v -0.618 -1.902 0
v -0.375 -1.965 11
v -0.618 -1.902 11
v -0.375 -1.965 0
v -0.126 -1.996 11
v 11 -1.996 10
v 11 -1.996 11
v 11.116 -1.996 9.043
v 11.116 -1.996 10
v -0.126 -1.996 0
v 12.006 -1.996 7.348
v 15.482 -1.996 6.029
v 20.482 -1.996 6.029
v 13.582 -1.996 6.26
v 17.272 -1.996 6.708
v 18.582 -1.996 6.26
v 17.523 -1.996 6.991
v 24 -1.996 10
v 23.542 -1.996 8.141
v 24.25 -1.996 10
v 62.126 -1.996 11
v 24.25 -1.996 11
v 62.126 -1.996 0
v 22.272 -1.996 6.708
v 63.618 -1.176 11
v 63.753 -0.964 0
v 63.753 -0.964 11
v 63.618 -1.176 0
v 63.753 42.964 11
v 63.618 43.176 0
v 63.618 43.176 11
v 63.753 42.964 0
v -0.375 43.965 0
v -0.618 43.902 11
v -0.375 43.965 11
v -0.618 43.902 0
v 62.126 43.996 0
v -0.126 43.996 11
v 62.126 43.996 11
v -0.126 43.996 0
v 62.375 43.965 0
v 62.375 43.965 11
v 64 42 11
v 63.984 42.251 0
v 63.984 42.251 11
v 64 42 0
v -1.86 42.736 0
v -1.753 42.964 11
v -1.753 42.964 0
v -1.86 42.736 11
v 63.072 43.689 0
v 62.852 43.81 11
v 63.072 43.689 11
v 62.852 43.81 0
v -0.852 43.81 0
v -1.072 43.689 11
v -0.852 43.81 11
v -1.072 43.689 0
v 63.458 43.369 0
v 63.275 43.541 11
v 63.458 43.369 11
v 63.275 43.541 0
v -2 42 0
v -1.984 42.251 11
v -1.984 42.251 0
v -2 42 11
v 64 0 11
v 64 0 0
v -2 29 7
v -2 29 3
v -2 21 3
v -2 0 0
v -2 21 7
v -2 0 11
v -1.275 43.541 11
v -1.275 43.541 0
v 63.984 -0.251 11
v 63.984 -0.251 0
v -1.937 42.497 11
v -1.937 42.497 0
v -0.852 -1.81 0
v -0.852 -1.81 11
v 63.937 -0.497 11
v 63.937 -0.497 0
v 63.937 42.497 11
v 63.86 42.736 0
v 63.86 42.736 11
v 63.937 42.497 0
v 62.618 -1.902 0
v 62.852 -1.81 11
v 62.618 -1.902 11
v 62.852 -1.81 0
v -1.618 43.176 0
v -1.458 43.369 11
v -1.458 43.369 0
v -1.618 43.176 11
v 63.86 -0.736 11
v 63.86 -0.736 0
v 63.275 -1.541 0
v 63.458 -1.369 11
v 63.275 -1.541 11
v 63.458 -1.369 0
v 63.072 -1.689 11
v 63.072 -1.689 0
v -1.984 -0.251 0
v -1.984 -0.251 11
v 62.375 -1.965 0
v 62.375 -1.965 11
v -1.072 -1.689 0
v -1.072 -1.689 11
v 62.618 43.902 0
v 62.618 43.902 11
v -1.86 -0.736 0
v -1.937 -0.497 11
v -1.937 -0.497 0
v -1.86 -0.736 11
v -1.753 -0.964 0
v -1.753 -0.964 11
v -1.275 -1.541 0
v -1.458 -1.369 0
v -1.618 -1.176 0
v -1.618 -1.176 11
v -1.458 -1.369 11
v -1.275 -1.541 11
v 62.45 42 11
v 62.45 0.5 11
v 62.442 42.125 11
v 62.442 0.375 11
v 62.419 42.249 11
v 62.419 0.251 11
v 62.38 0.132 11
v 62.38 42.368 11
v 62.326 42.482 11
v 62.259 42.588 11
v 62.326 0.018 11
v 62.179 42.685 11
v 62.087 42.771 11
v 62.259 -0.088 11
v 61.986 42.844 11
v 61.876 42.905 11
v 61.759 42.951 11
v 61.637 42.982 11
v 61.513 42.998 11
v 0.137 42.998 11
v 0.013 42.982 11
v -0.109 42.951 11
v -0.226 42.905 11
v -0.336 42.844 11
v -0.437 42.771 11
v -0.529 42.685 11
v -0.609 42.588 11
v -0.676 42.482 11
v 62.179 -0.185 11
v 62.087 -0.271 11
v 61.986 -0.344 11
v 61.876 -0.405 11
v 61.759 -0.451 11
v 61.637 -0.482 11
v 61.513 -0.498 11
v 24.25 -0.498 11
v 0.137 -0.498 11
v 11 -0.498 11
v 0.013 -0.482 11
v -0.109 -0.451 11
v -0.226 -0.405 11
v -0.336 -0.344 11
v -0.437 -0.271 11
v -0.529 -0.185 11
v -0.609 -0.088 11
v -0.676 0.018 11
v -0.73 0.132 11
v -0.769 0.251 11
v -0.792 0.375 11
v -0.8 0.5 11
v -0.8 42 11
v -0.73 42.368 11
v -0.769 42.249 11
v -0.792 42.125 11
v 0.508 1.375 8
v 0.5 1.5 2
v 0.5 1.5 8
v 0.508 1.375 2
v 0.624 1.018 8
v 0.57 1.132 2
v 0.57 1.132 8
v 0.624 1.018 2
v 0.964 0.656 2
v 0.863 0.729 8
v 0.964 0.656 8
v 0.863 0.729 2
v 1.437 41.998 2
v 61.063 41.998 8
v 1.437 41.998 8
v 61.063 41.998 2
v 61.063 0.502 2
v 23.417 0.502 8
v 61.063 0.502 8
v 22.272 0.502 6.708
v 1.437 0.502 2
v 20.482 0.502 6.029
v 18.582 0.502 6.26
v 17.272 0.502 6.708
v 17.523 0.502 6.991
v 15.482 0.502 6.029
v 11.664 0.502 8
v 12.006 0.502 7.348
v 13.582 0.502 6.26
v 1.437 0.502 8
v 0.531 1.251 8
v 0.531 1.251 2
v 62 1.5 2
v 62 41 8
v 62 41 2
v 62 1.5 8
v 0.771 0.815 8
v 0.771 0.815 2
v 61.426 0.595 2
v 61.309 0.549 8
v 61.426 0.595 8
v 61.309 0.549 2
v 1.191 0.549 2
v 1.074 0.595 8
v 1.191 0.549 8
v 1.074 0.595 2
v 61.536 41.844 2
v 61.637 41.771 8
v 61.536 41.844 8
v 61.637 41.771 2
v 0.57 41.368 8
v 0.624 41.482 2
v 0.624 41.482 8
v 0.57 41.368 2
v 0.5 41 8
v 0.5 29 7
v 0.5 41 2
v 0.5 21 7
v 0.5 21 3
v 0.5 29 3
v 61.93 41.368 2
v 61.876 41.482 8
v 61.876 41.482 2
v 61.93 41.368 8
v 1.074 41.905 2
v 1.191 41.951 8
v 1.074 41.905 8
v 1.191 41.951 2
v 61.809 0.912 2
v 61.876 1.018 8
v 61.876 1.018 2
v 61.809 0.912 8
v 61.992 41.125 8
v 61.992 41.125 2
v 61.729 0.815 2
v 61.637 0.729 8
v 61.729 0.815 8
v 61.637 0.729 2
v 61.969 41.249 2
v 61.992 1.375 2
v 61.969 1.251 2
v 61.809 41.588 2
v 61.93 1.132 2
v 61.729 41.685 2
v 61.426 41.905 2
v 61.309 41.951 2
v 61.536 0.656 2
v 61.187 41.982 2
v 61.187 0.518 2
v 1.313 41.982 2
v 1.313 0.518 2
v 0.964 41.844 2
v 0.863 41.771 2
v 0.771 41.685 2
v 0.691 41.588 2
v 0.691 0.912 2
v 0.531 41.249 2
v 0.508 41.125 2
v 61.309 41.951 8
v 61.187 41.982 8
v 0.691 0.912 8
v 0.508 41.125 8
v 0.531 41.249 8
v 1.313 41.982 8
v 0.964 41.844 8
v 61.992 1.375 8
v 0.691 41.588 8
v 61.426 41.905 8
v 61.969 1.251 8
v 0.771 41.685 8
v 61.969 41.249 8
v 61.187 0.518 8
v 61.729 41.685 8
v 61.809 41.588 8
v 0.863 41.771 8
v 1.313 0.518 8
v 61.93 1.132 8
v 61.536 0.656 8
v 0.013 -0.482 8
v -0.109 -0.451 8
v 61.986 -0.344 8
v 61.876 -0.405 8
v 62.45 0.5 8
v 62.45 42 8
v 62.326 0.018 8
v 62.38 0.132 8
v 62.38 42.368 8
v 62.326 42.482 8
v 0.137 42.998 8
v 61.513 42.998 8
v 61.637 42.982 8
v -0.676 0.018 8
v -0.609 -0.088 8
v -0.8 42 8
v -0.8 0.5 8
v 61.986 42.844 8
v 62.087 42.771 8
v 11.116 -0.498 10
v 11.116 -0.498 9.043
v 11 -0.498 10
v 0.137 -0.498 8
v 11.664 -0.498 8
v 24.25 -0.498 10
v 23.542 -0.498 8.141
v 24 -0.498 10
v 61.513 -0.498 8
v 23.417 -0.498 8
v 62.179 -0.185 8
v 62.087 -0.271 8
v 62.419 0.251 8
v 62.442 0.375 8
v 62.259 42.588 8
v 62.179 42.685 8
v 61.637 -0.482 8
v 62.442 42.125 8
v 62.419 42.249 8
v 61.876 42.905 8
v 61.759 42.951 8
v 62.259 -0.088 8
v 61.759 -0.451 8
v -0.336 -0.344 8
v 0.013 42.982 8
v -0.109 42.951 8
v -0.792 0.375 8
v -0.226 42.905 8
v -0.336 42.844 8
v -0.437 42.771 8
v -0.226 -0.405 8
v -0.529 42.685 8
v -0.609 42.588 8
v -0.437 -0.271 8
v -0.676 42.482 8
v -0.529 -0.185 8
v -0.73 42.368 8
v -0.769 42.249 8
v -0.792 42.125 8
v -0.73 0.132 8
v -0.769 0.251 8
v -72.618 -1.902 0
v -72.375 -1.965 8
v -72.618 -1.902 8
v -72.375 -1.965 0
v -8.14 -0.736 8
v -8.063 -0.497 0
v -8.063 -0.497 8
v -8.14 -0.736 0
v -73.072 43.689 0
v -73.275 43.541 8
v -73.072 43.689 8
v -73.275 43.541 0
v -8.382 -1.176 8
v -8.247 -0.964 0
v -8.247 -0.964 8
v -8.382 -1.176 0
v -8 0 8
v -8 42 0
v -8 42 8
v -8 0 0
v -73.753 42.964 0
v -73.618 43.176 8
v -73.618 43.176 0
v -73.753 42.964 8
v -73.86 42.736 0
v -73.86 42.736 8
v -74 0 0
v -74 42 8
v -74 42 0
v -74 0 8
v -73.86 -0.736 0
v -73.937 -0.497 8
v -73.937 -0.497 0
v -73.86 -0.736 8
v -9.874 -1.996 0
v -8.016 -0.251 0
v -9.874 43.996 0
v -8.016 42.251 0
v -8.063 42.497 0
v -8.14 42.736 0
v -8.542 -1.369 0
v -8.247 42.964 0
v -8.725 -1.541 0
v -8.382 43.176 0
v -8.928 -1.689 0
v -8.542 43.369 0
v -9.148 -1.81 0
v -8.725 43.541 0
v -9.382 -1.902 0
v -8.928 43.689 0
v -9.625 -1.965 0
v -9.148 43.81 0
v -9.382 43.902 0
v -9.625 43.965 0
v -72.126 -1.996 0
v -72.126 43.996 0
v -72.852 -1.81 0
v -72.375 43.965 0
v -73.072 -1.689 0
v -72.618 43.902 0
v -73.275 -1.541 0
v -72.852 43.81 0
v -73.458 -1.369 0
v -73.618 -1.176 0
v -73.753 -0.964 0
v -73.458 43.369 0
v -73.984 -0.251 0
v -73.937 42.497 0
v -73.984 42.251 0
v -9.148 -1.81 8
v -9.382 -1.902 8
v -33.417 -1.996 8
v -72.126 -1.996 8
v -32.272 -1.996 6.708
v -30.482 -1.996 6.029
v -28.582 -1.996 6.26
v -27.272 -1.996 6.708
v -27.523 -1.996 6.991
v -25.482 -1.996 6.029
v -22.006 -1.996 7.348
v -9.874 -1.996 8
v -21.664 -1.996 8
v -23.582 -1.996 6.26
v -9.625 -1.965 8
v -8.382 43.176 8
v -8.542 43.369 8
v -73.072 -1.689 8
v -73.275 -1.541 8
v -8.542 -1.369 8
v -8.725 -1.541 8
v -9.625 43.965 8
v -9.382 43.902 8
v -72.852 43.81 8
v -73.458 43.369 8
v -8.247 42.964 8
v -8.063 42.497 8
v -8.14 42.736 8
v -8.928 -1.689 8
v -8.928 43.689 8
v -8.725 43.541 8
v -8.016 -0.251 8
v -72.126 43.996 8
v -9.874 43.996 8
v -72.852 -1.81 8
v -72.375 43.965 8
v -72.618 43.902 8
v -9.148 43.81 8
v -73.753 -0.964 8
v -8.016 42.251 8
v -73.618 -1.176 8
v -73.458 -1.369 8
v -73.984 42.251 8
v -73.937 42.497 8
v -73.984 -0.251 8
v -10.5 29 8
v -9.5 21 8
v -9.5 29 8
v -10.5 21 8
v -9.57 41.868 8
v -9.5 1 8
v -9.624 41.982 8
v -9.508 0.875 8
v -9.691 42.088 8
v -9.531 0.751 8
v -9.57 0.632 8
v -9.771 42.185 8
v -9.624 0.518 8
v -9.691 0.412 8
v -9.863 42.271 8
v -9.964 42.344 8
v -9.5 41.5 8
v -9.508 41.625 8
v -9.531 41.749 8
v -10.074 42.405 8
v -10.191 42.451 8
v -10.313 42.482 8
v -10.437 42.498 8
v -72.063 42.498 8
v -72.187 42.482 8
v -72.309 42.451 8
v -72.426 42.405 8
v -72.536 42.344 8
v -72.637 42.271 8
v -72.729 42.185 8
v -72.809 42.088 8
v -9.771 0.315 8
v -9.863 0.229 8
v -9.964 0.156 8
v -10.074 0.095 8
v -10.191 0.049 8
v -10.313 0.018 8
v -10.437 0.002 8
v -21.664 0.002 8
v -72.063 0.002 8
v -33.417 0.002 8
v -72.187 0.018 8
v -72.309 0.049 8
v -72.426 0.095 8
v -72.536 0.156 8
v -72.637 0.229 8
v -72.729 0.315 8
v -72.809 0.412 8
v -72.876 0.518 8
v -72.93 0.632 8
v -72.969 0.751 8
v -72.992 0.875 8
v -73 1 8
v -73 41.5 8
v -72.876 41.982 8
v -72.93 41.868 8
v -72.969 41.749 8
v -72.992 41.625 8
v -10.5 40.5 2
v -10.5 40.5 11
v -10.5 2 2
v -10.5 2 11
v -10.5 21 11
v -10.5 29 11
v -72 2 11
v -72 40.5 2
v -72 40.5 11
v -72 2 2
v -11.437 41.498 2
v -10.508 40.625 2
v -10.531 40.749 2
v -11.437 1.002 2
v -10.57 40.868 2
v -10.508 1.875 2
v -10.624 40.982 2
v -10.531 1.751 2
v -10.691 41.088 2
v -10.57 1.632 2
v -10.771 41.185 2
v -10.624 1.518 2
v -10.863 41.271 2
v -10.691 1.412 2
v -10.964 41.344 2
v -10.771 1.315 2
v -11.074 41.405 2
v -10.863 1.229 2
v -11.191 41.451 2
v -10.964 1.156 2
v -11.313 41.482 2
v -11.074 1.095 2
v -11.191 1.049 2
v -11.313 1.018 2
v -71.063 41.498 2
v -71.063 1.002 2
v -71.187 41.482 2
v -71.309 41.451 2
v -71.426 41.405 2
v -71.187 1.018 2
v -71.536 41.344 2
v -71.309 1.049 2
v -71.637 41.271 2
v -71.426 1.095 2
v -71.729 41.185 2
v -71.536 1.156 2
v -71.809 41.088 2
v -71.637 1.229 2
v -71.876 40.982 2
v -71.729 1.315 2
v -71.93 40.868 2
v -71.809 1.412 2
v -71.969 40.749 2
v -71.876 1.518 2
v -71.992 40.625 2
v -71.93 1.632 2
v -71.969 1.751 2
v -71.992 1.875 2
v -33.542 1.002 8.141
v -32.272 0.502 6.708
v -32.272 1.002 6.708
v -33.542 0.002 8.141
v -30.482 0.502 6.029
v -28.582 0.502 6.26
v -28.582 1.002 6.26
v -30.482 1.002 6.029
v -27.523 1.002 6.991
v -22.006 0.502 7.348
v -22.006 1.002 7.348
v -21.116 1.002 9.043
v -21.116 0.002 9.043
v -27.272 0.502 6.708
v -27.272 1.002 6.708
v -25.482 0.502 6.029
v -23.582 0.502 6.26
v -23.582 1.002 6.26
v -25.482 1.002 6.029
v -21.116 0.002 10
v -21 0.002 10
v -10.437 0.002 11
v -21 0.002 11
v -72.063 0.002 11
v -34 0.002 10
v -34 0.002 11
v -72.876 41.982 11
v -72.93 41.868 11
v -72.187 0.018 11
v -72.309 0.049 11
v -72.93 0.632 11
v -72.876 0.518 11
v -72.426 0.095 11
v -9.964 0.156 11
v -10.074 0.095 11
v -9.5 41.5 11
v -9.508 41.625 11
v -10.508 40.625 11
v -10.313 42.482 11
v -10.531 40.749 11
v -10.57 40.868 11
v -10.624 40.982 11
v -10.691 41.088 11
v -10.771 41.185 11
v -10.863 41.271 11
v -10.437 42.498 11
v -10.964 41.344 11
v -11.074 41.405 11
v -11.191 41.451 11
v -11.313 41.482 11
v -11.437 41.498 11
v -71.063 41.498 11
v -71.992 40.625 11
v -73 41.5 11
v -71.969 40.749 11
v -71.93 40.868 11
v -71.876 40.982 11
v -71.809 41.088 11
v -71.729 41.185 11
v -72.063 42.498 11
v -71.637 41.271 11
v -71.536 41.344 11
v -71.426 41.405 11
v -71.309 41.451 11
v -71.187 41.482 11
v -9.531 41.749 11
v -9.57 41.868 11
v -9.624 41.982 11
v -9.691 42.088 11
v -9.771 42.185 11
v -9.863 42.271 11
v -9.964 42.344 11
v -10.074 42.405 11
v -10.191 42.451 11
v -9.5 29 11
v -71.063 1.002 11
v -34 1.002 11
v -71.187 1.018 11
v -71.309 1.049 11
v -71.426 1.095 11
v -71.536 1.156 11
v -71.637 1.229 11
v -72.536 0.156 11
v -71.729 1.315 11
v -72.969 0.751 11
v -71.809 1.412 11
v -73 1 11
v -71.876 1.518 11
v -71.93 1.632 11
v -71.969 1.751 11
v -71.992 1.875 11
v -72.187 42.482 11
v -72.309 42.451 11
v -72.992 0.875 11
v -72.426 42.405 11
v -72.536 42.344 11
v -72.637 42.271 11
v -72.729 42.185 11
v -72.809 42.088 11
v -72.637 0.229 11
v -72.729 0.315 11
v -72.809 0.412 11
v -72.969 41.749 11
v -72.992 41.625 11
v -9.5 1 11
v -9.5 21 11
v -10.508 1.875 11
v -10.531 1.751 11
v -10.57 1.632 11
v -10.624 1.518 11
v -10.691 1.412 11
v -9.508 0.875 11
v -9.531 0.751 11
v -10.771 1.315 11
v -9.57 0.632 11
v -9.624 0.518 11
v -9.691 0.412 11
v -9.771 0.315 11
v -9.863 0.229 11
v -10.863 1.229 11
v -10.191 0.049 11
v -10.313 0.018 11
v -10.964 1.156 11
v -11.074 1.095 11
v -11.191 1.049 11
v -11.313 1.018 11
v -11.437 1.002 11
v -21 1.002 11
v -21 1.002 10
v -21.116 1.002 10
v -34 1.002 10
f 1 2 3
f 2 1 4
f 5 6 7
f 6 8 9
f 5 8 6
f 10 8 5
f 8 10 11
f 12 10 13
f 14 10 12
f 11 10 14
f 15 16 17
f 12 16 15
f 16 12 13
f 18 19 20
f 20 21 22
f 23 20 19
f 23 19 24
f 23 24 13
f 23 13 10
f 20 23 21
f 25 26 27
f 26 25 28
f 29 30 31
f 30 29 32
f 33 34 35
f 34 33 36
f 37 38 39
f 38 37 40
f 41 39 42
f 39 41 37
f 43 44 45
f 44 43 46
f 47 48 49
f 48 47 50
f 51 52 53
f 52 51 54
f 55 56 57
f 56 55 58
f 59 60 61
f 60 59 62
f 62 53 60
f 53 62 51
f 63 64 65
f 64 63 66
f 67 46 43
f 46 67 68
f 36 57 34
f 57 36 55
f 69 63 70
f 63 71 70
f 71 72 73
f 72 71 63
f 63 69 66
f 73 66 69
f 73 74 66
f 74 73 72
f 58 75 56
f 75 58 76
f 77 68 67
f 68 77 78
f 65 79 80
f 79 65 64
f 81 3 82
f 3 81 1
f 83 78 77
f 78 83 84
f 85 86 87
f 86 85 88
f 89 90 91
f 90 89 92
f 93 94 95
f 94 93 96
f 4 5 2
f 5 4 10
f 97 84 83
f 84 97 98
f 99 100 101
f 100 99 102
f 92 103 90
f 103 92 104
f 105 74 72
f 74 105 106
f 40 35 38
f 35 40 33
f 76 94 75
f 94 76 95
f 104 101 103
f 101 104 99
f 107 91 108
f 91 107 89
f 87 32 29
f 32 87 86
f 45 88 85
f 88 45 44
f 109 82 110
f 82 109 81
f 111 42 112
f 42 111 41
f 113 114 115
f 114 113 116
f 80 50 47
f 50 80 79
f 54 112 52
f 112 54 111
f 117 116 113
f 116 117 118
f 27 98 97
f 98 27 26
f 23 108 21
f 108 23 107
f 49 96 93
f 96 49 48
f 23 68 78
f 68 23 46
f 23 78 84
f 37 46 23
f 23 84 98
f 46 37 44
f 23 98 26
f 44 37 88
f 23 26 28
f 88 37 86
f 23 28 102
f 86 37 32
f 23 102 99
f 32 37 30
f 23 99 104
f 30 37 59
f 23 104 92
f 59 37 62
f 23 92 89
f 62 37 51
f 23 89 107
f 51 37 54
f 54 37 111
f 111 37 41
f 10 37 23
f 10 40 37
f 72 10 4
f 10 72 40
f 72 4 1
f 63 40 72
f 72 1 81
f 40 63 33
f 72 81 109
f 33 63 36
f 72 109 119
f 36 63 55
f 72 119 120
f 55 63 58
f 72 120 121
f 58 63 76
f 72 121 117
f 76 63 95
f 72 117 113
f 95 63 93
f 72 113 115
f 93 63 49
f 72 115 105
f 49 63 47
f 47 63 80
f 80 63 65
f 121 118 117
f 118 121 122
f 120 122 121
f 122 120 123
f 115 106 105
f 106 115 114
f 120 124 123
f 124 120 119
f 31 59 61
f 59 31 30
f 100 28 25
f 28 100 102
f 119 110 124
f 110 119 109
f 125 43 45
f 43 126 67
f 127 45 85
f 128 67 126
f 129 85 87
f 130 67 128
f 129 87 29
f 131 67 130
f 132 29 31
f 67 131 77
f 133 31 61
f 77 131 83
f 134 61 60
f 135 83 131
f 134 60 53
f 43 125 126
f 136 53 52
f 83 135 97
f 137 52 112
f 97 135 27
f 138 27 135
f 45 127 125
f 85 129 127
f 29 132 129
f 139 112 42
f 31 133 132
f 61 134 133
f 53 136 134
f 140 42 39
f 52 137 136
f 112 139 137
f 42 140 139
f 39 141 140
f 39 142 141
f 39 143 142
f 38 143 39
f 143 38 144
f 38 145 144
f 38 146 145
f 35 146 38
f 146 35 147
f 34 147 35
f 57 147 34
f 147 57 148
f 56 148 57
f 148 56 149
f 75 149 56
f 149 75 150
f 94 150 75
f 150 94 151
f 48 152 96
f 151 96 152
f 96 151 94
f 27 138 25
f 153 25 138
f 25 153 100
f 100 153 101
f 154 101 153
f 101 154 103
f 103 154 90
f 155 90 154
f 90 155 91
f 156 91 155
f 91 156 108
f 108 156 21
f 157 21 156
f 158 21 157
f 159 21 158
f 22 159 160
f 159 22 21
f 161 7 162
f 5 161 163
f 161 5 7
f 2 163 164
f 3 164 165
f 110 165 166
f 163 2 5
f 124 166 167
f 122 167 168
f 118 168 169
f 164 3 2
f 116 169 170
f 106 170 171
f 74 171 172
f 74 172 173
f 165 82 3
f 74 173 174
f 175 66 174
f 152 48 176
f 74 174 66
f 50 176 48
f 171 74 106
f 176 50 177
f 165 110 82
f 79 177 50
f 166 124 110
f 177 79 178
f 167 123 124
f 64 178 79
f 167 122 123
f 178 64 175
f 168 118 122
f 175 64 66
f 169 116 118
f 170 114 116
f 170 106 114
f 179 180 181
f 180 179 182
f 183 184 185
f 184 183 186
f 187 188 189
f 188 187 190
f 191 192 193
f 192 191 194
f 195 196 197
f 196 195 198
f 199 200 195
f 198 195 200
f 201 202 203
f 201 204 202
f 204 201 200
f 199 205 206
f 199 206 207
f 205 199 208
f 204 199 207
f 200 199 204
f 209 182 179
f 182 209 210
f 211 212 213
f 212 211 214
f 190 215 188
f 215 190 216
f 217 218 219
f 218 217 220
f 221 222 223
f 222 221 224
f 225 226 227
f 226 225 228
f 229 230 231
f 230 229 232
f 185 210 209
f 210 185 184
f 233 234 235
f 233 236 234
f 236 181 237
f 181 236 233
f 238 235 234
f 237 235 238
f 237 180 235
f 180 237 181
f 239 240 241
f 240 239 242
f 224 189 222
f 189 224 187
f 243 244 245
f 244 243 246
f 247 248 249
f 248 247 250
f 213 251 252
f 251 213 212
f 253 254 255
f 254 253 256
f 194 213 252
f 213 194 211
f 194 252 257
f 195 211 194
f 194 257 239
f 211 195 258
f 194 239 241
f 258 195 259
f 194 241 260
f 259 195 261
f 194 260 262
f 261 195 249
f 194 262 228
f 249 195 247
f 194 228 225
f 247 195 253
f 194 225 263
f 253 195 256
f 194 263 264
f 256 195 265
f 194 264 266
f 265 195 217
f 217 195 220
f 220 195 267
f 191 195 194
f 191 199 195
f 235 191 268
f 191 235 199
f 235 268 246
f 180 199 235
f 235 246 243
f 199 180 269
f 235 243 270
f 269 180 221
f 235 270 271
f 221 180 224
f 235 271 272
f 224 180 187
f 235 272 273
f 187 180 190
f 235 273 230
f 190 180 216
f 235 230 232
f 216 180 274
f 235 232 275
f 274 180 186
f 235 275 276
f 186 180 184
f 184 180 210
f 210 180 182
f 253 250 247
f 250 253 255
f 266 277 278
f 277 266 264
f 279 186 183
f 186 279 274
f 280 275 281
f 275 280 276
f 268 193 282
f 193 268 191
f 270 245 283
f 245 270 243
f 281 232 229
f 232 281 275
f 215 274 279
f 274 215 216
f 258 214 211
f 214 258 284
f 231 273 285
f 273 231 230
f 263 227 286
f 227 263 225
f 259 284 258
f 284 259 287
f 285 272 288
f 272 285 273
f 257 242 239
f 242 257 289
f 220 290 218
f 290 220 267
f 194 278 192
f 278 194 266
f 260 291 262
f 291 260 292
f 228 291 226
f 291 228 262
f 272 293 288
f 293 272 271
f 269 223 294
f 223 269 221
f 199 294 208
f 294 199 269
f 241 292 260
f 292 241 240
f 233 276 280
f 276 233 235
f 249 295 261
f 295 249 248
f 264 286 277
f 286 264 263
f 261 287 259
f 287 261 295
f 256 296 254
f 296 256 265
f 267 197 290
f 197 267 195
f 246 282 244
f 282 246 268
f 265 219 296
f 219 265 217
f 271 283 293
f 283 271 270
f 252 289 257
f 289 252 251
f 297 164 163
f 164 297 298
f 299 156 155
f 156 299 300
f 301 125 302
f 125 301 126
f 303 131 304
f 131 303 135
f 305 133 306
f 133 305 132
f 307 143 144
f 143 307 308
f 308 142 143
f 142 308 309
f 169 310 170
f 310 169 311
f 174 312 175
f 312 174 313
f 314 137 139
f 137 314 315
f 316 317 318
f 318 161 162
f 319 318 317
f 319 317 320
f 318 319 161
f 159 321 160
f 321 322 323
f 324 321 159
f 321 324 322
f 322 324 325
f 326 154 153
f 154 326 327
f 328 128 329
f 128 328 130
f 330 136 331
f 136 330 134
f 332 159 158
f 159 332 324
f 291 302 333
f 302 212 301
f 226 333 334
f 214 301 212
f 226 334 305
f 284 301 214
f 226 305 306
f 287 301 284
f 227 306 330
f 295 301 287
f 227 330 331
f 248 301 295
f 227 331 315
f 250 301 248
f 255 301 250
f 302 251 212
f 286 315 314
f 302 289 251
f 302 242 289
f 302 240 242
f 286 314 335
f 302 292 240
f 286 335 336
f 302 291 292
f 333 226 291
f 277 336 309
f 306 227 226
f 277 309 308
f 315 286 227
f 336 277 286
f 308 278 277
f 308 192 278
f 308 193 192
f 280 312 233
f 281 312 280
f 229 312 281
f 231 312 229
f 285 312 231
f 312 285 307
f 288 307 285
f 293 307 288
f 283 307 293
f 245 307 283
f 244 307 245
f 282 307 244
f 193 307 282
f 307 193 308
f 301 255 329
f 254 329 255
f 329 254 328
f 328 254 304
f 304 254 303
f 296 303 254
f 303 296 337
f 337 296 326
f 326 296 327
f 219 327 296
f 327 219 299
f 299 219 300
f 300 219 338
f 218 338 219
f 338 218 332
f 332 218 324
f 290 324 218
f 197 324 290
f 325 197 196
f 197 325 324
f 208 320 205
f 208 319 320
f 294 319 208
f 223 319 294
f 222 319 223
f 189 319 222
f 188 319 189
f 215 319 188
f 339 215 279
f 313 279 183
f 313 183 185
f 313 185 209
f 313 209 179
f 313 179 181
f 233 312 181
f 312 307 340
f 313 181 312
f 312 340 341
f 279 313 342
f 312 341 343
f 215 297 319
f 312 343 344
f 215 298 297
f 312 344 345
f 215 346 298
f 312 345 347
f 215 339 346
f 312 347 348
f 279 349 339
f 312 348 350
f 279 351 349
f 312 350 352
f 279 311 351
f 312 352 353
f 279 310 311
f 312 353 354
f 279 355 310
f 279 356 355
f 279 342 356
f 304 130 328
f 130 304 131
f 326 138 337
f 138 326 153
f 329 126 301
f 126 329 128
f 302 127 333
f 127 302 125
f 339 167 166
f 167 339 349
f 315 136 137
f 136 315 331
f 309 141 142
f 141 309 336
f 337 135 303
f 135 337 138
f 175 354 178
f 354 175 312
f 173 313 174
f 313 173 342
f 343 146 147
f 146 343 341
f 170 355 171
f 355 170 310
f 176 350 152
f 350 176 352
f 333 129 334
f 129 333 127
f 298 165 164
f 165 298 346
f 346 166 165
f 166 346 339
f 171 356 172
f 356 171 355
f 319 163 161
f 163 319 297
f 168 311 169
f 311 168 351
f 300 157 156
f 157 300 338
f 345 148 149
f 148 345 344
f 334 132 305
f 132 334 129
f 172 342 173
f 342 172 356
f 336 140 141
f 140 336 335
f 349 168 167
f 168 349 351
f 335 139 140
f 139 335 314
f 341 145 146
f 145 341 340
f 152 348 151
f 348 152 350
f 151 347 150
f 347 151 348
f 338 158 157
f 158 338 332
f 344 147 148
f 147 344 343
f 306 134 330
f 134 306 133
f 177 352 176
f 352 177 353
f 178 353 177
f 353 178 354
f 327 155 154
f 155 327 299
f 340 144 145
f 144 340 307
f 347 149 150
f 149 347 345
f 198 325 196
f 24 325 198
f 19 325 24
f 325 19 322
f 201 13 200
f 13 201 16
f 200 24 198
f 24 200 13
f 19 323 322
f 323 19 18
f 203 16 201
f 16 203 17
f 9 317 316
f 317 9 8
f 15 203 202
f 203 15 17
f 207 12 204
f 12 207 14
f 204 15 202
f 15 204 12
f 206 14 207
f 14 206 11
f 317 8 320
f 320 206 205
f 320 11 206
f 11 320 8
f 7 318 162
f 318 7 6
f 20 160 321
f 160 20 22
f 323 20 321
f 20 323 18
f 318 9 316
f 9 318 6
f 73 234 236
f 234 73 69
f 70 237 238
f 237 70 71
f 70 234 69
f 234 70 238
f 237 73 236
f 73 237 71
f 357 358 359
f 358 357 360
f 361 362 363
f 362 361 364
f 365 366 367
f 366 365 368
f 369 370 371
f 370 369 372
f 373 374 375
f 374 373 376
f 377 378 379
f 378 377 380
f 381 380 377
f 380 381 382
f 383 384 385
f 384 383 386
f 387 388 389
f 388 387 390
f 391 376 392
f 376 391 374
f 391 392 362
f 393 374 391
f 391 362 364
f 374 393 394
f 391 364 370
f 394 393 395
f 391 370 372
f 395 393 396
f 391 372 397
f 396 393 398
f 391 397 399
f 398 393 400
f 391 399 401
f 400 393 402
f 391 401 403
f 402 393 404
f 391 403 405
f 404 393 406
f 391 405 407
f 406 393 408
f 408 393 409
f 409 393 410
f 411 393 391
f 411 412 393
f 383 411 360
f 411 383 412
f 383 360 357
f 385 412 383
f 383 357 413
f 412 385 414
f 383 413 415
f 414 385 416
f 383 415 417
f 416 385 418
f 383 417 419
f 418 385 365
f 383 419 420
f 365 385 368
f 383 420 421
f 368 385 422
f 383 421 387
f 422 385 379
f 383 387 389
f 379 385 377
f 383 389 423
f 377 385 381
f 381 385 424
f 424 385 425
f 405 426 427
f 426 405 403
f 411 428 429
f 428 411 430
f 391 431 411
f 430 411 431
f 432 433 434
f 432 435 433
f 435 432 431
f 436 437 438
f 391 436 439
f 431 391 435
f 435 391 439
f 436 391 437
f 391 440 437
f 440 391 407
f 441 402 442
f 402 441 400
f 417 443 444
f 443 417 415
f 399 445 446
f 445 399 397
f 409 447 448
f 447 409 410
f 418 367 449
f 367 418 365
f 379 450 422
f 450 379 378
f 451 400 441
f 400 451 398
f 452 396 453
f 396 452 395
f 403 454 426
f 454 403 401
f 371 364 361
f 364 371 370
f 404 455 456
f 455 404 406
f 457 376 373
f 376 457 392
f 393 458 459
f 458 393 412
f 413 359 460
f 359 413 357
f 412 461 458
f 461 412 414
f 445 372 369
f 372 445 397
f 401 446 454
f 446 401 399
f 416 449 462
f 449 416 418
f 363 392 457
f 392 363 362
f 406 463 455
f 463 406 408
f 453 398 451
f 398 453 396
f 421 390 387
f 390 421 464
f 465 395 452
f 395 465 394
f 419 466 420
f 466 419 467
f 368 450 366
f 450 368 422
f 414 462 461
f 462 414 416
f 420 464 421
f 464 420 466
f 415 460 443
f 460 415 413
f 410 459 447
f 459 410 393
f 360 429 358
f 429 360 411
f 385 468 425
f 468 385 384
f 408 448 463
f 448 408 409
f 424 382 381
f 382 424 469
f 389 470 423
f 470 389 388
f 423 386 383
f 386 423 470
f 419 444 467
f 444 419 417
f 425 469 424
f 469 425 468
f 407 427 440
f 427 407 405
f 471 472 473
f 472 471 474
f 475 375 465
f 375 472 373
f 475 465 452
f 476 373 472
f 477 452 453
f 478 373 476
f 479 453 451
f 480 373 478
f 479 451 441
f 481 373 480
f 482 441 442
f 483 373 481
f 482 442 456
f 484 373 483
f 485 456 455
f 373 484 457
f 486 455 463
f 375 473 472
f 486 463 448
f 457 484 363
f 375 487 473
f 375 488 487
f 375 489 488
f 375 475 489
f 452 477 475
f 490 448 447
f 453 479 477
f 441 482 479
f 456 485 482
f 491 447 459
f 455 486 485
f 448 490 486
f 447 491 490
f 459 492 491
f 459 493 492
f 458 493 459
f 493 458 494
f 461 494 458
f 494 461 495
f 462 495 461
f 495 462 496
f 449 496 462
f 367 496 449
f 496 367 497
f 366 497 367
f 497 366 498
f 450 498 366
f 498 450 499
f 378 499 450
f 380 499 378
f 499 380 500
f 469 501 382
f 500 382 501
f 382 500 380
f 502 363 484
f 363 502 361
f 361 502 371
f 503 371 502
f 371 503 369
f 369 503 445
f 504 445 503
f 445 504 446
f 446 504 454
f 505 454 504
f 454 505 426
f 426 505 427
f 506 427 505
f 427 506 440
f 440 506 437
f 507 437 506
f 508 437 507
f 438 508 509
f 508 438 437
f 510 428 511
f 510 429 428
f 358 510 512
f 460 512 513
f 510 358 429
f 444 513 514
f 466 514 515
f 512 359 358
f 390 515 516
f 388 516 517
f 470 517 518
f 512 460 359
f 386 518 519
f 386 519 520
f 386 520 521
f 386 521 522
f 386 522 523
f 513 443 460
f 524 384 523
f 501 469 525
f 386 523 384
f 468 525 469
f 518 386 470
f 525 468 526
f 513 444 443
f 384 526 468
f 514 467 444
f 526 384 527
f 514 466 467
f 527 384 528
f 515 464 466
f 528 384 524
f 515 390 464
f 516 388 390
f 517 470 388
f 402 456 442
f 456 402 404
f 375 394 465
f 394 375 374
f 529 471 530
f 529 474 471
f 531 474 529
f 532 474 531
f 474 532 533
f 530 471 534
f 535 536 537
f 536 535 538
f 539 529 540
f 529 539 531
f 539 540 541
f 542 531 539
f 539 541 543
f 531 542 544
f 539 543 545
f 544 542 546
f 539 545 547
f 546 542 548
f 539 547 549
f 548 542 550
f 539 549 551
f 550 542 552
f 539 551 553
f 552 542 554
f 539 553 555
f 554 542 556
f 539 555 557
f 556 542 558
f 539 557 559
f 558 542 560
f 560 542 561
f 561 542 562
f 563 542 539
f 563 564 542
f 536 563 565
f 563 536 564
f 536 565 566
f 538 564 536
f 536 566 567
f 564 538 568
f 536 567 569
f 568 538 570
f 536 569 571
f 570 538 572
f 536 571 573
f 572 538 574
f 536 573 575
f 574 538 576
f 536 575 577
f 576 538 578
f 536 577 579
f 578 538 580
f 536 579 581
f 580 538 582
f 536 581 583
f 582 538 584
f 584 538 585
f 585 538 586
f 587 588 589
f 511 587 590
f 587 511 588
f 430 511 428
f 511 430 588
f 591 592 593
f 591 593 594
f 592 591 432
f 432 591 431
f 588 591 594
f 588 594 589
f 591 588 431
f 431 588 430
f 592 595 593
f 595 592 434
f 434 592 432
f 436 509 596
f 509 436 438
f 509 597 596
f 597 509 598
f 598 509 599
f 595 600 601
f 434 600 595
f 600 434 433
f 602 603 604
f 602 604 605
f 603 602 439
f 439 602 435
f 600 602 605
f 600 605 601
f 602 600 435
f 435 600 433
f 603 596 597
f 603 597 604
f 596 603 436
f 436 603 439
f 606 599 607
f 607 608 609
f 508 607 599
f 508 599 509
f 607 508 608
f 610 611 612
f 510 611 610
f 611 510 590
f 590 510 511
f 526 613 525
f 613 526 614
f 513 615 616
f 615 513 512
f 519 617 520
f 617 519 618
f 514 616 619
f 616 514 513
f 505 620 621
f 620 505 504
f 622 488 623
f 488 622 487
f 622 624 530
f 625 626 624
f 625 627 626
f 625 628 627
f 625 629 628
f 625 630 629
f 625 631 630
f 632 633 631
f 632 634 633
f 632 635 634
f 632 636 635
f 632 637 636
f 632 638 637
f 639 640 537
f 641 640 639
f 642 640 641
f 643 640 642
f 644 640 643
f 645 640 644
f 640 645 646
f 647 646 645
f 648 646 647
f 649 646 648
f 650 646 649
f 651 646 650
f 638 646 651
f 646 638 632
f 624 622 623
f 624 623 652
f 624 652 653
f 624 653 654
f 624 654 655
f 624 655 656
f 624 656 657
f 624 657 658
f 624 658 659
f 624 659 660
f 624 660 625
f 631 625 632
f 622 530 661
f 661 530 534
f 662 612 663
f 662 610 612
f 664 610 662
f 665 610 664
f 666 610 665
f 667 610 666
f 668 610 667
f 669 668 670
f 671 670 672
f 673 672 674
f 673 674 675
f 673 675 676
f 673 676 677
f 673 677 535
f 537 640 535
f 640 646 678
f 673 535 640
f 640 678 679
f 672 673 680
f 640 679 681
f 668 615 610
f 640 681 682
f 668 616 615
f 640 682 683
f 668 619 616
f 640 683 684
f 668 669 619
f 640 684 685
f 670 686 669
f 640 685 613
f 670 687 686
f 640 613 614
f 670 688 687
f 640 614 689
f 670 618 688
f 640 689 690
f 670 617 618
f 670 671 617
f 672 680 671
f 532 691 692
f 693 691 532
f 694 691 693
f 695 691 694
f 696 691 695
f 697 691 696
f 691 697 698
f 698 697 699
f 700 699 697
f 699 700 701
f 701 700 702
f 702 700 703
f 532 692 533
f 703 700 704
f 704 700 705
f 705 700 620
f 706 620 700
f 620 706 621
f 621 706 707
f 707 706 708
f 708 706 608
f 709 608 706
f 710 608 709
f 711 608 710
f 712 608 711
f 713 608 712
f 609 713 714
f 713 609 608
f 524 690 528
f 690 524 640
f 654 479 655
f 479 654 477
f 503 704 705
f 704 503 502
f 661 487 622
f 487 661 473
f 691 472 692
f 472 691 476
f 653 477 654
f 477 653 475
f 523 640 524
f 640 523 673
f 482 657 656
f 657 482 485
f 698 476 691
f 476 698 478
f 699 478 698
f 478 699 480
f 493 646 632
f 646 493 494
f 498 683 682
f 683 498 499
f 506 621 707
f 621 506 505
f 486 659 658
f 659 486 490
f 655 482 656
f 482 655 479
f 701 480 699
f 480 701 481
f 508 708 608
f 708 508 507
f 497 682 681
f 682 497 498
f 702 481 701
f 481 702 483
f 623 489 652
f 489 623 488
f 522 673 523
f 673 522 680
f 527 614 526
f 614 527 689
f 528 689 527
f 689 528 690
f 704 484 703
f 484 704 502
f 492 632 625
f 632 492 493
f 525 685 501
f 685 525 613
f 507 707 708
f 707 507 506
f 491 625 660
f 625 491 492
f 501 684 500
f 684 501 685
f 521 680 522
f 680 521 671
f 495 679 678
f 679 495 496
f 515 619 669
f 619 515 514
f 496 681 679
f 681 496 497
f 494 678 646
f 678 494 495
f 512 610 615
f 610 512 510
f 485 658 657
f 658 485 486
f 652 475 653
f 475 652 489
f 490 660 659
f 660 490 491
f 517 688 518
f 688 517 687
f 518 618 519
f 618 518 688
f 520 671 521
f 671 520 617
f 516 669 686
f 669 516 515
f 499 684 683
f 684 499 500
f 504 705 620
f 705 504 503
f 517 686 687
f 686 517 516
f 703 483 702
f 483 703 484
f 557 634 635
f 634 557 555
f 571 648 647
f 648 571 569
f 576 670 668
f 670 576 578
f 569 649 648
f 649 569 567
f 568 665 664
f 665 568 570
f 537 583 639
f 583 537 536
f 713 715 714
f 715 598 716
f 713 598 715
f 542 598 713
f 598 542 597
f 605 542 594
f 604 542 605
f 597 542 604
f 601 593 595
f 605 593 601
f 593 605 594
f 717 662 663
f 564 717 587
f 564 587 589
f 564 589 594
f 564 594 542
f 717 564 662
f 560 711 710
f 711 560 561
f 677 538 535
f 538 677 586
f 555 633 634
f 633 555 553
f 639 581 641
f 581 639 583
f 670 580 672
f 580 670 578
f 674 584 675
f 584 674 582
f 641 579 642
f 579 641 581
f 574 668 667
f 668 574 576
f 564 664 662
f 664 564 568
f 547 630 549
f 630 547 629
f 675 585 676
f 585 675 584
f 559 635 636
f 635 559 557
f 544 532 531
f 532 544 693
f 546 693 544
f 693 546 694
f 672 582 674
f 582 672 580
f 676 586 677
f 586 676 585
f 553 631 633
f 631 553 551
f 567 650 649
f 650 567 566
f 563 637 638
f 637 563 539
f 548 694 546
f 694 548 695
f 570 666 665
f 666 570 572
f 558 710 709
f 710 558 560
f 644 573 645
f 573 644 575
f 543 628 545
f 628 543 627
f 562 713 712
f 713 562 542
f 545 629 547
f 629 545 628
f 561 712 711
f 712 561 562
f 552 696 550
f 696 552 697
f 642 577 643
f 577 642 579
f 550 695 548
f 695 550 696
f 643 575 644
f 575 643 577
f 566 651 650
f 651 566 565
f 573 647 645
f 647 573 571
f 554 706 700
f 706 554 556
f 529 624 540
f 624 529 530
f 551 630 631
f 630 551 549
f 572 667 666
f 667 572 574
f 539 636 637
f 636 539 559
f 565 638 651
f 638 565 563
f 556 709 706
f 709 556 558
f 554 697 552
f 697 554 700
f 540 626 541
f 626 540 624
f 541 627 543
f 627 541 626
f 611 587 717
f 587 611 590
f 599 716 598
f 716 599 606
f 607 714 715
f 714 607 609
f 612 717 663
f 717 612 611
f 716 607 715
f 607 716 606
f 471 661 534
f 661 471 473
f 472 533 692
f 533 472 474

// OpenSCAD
// Simple OpenSCAD script to generate a case for the IR blaster.
// Created by Jay Boehm <jayrox@gmail.com> 2017

cube_half(size = [63, 43, 10], side = "top");

mirror([1,0,0]) 
    translate([10, 0, 0])
    cube_half(size = [63, 43, 10], side = "bottom");

module cube_half(size, side = "top") {
    w = size[0];
    d = size[1];
    h = (side == "top") ? size[2] : size[2] - 3;
    
    difference() {
        miniround([w, d, h], 2);
        // Hollow
        translate([1.5, 1.5, 2]) {
            miniround([w - 3, d - 3, h - 1], 1);    
        }

        // Outer Lip
        if (side == "top") {
            translate([0.20, 0.5, 8]) {
                miniround([w - 1.25, d - 1, 3], 1);    
            }
        }

        // LED ports
        rotate([90, 0, 0]) {
            translate([20, 10, -5]) 
                color("red")
                cylinder(h=10, r=4);
        }
        rotate([90, 0, 0]) {
            translate([15, 10, -5]) 
                color("red")
                cylinder(h=10, r=4);

        }
        // This squares off the edges around the LED ports
        rotate([90, 0, 0]) {
            translate([11, 10, -5])
                color("red")
                cube([13.25,5,10]);

        }

        if (side == "top") {
            // USB port
            translate([-5, 21, 3]) {
                color("red")
                cube([10, 8, h / 2 -1]);
            }
        }
    }
    // Outer Lip
    if (side == "bottom") {
        translate([0.5, 1, 0]) {
            difference() {
                miniround([w - 1, d - 2, h + 3], 1);    
                // Hollow
                translate([1, 1, 0]) {
                    miniround([w-3, d-4, h + 4], 1);    
                }
                // LED ports
                rotate([90, 0, 0]) {
                    translate([19.5, 10, -5]) 
                        color("red")
                        cylinder(h=10, r=4);
                }
                rotate([90, 0, 0]) {
                    translate([14.5, 10, -5]) 
                        color("red")
                        cylinder(h=10, r=4);

                }
                // This squares off the edges around the LED ports
                rotate([90, 0, 0]) {
                    translate([10.5, 10, -5])
                        color("red")
                        cube([13,5,10]);

                }
                // USB port
                translate([-5, 20, 7]) {
                    color("red")
                    cube([10, 8, h / 2 + 2]);
                }
            }
        }
    }
}

module miniround(size, radius) {
    $fn=50;
    x = size[0]-radius/2;
    y = size[1]-radius/2;

    minkowski()
    {
        cube(size=[x,y,size[2]]);
        cylinder(r=radius);
        // Using a sphere is possible, but will kill performance
        //sphere(r=radius);
    }
}
